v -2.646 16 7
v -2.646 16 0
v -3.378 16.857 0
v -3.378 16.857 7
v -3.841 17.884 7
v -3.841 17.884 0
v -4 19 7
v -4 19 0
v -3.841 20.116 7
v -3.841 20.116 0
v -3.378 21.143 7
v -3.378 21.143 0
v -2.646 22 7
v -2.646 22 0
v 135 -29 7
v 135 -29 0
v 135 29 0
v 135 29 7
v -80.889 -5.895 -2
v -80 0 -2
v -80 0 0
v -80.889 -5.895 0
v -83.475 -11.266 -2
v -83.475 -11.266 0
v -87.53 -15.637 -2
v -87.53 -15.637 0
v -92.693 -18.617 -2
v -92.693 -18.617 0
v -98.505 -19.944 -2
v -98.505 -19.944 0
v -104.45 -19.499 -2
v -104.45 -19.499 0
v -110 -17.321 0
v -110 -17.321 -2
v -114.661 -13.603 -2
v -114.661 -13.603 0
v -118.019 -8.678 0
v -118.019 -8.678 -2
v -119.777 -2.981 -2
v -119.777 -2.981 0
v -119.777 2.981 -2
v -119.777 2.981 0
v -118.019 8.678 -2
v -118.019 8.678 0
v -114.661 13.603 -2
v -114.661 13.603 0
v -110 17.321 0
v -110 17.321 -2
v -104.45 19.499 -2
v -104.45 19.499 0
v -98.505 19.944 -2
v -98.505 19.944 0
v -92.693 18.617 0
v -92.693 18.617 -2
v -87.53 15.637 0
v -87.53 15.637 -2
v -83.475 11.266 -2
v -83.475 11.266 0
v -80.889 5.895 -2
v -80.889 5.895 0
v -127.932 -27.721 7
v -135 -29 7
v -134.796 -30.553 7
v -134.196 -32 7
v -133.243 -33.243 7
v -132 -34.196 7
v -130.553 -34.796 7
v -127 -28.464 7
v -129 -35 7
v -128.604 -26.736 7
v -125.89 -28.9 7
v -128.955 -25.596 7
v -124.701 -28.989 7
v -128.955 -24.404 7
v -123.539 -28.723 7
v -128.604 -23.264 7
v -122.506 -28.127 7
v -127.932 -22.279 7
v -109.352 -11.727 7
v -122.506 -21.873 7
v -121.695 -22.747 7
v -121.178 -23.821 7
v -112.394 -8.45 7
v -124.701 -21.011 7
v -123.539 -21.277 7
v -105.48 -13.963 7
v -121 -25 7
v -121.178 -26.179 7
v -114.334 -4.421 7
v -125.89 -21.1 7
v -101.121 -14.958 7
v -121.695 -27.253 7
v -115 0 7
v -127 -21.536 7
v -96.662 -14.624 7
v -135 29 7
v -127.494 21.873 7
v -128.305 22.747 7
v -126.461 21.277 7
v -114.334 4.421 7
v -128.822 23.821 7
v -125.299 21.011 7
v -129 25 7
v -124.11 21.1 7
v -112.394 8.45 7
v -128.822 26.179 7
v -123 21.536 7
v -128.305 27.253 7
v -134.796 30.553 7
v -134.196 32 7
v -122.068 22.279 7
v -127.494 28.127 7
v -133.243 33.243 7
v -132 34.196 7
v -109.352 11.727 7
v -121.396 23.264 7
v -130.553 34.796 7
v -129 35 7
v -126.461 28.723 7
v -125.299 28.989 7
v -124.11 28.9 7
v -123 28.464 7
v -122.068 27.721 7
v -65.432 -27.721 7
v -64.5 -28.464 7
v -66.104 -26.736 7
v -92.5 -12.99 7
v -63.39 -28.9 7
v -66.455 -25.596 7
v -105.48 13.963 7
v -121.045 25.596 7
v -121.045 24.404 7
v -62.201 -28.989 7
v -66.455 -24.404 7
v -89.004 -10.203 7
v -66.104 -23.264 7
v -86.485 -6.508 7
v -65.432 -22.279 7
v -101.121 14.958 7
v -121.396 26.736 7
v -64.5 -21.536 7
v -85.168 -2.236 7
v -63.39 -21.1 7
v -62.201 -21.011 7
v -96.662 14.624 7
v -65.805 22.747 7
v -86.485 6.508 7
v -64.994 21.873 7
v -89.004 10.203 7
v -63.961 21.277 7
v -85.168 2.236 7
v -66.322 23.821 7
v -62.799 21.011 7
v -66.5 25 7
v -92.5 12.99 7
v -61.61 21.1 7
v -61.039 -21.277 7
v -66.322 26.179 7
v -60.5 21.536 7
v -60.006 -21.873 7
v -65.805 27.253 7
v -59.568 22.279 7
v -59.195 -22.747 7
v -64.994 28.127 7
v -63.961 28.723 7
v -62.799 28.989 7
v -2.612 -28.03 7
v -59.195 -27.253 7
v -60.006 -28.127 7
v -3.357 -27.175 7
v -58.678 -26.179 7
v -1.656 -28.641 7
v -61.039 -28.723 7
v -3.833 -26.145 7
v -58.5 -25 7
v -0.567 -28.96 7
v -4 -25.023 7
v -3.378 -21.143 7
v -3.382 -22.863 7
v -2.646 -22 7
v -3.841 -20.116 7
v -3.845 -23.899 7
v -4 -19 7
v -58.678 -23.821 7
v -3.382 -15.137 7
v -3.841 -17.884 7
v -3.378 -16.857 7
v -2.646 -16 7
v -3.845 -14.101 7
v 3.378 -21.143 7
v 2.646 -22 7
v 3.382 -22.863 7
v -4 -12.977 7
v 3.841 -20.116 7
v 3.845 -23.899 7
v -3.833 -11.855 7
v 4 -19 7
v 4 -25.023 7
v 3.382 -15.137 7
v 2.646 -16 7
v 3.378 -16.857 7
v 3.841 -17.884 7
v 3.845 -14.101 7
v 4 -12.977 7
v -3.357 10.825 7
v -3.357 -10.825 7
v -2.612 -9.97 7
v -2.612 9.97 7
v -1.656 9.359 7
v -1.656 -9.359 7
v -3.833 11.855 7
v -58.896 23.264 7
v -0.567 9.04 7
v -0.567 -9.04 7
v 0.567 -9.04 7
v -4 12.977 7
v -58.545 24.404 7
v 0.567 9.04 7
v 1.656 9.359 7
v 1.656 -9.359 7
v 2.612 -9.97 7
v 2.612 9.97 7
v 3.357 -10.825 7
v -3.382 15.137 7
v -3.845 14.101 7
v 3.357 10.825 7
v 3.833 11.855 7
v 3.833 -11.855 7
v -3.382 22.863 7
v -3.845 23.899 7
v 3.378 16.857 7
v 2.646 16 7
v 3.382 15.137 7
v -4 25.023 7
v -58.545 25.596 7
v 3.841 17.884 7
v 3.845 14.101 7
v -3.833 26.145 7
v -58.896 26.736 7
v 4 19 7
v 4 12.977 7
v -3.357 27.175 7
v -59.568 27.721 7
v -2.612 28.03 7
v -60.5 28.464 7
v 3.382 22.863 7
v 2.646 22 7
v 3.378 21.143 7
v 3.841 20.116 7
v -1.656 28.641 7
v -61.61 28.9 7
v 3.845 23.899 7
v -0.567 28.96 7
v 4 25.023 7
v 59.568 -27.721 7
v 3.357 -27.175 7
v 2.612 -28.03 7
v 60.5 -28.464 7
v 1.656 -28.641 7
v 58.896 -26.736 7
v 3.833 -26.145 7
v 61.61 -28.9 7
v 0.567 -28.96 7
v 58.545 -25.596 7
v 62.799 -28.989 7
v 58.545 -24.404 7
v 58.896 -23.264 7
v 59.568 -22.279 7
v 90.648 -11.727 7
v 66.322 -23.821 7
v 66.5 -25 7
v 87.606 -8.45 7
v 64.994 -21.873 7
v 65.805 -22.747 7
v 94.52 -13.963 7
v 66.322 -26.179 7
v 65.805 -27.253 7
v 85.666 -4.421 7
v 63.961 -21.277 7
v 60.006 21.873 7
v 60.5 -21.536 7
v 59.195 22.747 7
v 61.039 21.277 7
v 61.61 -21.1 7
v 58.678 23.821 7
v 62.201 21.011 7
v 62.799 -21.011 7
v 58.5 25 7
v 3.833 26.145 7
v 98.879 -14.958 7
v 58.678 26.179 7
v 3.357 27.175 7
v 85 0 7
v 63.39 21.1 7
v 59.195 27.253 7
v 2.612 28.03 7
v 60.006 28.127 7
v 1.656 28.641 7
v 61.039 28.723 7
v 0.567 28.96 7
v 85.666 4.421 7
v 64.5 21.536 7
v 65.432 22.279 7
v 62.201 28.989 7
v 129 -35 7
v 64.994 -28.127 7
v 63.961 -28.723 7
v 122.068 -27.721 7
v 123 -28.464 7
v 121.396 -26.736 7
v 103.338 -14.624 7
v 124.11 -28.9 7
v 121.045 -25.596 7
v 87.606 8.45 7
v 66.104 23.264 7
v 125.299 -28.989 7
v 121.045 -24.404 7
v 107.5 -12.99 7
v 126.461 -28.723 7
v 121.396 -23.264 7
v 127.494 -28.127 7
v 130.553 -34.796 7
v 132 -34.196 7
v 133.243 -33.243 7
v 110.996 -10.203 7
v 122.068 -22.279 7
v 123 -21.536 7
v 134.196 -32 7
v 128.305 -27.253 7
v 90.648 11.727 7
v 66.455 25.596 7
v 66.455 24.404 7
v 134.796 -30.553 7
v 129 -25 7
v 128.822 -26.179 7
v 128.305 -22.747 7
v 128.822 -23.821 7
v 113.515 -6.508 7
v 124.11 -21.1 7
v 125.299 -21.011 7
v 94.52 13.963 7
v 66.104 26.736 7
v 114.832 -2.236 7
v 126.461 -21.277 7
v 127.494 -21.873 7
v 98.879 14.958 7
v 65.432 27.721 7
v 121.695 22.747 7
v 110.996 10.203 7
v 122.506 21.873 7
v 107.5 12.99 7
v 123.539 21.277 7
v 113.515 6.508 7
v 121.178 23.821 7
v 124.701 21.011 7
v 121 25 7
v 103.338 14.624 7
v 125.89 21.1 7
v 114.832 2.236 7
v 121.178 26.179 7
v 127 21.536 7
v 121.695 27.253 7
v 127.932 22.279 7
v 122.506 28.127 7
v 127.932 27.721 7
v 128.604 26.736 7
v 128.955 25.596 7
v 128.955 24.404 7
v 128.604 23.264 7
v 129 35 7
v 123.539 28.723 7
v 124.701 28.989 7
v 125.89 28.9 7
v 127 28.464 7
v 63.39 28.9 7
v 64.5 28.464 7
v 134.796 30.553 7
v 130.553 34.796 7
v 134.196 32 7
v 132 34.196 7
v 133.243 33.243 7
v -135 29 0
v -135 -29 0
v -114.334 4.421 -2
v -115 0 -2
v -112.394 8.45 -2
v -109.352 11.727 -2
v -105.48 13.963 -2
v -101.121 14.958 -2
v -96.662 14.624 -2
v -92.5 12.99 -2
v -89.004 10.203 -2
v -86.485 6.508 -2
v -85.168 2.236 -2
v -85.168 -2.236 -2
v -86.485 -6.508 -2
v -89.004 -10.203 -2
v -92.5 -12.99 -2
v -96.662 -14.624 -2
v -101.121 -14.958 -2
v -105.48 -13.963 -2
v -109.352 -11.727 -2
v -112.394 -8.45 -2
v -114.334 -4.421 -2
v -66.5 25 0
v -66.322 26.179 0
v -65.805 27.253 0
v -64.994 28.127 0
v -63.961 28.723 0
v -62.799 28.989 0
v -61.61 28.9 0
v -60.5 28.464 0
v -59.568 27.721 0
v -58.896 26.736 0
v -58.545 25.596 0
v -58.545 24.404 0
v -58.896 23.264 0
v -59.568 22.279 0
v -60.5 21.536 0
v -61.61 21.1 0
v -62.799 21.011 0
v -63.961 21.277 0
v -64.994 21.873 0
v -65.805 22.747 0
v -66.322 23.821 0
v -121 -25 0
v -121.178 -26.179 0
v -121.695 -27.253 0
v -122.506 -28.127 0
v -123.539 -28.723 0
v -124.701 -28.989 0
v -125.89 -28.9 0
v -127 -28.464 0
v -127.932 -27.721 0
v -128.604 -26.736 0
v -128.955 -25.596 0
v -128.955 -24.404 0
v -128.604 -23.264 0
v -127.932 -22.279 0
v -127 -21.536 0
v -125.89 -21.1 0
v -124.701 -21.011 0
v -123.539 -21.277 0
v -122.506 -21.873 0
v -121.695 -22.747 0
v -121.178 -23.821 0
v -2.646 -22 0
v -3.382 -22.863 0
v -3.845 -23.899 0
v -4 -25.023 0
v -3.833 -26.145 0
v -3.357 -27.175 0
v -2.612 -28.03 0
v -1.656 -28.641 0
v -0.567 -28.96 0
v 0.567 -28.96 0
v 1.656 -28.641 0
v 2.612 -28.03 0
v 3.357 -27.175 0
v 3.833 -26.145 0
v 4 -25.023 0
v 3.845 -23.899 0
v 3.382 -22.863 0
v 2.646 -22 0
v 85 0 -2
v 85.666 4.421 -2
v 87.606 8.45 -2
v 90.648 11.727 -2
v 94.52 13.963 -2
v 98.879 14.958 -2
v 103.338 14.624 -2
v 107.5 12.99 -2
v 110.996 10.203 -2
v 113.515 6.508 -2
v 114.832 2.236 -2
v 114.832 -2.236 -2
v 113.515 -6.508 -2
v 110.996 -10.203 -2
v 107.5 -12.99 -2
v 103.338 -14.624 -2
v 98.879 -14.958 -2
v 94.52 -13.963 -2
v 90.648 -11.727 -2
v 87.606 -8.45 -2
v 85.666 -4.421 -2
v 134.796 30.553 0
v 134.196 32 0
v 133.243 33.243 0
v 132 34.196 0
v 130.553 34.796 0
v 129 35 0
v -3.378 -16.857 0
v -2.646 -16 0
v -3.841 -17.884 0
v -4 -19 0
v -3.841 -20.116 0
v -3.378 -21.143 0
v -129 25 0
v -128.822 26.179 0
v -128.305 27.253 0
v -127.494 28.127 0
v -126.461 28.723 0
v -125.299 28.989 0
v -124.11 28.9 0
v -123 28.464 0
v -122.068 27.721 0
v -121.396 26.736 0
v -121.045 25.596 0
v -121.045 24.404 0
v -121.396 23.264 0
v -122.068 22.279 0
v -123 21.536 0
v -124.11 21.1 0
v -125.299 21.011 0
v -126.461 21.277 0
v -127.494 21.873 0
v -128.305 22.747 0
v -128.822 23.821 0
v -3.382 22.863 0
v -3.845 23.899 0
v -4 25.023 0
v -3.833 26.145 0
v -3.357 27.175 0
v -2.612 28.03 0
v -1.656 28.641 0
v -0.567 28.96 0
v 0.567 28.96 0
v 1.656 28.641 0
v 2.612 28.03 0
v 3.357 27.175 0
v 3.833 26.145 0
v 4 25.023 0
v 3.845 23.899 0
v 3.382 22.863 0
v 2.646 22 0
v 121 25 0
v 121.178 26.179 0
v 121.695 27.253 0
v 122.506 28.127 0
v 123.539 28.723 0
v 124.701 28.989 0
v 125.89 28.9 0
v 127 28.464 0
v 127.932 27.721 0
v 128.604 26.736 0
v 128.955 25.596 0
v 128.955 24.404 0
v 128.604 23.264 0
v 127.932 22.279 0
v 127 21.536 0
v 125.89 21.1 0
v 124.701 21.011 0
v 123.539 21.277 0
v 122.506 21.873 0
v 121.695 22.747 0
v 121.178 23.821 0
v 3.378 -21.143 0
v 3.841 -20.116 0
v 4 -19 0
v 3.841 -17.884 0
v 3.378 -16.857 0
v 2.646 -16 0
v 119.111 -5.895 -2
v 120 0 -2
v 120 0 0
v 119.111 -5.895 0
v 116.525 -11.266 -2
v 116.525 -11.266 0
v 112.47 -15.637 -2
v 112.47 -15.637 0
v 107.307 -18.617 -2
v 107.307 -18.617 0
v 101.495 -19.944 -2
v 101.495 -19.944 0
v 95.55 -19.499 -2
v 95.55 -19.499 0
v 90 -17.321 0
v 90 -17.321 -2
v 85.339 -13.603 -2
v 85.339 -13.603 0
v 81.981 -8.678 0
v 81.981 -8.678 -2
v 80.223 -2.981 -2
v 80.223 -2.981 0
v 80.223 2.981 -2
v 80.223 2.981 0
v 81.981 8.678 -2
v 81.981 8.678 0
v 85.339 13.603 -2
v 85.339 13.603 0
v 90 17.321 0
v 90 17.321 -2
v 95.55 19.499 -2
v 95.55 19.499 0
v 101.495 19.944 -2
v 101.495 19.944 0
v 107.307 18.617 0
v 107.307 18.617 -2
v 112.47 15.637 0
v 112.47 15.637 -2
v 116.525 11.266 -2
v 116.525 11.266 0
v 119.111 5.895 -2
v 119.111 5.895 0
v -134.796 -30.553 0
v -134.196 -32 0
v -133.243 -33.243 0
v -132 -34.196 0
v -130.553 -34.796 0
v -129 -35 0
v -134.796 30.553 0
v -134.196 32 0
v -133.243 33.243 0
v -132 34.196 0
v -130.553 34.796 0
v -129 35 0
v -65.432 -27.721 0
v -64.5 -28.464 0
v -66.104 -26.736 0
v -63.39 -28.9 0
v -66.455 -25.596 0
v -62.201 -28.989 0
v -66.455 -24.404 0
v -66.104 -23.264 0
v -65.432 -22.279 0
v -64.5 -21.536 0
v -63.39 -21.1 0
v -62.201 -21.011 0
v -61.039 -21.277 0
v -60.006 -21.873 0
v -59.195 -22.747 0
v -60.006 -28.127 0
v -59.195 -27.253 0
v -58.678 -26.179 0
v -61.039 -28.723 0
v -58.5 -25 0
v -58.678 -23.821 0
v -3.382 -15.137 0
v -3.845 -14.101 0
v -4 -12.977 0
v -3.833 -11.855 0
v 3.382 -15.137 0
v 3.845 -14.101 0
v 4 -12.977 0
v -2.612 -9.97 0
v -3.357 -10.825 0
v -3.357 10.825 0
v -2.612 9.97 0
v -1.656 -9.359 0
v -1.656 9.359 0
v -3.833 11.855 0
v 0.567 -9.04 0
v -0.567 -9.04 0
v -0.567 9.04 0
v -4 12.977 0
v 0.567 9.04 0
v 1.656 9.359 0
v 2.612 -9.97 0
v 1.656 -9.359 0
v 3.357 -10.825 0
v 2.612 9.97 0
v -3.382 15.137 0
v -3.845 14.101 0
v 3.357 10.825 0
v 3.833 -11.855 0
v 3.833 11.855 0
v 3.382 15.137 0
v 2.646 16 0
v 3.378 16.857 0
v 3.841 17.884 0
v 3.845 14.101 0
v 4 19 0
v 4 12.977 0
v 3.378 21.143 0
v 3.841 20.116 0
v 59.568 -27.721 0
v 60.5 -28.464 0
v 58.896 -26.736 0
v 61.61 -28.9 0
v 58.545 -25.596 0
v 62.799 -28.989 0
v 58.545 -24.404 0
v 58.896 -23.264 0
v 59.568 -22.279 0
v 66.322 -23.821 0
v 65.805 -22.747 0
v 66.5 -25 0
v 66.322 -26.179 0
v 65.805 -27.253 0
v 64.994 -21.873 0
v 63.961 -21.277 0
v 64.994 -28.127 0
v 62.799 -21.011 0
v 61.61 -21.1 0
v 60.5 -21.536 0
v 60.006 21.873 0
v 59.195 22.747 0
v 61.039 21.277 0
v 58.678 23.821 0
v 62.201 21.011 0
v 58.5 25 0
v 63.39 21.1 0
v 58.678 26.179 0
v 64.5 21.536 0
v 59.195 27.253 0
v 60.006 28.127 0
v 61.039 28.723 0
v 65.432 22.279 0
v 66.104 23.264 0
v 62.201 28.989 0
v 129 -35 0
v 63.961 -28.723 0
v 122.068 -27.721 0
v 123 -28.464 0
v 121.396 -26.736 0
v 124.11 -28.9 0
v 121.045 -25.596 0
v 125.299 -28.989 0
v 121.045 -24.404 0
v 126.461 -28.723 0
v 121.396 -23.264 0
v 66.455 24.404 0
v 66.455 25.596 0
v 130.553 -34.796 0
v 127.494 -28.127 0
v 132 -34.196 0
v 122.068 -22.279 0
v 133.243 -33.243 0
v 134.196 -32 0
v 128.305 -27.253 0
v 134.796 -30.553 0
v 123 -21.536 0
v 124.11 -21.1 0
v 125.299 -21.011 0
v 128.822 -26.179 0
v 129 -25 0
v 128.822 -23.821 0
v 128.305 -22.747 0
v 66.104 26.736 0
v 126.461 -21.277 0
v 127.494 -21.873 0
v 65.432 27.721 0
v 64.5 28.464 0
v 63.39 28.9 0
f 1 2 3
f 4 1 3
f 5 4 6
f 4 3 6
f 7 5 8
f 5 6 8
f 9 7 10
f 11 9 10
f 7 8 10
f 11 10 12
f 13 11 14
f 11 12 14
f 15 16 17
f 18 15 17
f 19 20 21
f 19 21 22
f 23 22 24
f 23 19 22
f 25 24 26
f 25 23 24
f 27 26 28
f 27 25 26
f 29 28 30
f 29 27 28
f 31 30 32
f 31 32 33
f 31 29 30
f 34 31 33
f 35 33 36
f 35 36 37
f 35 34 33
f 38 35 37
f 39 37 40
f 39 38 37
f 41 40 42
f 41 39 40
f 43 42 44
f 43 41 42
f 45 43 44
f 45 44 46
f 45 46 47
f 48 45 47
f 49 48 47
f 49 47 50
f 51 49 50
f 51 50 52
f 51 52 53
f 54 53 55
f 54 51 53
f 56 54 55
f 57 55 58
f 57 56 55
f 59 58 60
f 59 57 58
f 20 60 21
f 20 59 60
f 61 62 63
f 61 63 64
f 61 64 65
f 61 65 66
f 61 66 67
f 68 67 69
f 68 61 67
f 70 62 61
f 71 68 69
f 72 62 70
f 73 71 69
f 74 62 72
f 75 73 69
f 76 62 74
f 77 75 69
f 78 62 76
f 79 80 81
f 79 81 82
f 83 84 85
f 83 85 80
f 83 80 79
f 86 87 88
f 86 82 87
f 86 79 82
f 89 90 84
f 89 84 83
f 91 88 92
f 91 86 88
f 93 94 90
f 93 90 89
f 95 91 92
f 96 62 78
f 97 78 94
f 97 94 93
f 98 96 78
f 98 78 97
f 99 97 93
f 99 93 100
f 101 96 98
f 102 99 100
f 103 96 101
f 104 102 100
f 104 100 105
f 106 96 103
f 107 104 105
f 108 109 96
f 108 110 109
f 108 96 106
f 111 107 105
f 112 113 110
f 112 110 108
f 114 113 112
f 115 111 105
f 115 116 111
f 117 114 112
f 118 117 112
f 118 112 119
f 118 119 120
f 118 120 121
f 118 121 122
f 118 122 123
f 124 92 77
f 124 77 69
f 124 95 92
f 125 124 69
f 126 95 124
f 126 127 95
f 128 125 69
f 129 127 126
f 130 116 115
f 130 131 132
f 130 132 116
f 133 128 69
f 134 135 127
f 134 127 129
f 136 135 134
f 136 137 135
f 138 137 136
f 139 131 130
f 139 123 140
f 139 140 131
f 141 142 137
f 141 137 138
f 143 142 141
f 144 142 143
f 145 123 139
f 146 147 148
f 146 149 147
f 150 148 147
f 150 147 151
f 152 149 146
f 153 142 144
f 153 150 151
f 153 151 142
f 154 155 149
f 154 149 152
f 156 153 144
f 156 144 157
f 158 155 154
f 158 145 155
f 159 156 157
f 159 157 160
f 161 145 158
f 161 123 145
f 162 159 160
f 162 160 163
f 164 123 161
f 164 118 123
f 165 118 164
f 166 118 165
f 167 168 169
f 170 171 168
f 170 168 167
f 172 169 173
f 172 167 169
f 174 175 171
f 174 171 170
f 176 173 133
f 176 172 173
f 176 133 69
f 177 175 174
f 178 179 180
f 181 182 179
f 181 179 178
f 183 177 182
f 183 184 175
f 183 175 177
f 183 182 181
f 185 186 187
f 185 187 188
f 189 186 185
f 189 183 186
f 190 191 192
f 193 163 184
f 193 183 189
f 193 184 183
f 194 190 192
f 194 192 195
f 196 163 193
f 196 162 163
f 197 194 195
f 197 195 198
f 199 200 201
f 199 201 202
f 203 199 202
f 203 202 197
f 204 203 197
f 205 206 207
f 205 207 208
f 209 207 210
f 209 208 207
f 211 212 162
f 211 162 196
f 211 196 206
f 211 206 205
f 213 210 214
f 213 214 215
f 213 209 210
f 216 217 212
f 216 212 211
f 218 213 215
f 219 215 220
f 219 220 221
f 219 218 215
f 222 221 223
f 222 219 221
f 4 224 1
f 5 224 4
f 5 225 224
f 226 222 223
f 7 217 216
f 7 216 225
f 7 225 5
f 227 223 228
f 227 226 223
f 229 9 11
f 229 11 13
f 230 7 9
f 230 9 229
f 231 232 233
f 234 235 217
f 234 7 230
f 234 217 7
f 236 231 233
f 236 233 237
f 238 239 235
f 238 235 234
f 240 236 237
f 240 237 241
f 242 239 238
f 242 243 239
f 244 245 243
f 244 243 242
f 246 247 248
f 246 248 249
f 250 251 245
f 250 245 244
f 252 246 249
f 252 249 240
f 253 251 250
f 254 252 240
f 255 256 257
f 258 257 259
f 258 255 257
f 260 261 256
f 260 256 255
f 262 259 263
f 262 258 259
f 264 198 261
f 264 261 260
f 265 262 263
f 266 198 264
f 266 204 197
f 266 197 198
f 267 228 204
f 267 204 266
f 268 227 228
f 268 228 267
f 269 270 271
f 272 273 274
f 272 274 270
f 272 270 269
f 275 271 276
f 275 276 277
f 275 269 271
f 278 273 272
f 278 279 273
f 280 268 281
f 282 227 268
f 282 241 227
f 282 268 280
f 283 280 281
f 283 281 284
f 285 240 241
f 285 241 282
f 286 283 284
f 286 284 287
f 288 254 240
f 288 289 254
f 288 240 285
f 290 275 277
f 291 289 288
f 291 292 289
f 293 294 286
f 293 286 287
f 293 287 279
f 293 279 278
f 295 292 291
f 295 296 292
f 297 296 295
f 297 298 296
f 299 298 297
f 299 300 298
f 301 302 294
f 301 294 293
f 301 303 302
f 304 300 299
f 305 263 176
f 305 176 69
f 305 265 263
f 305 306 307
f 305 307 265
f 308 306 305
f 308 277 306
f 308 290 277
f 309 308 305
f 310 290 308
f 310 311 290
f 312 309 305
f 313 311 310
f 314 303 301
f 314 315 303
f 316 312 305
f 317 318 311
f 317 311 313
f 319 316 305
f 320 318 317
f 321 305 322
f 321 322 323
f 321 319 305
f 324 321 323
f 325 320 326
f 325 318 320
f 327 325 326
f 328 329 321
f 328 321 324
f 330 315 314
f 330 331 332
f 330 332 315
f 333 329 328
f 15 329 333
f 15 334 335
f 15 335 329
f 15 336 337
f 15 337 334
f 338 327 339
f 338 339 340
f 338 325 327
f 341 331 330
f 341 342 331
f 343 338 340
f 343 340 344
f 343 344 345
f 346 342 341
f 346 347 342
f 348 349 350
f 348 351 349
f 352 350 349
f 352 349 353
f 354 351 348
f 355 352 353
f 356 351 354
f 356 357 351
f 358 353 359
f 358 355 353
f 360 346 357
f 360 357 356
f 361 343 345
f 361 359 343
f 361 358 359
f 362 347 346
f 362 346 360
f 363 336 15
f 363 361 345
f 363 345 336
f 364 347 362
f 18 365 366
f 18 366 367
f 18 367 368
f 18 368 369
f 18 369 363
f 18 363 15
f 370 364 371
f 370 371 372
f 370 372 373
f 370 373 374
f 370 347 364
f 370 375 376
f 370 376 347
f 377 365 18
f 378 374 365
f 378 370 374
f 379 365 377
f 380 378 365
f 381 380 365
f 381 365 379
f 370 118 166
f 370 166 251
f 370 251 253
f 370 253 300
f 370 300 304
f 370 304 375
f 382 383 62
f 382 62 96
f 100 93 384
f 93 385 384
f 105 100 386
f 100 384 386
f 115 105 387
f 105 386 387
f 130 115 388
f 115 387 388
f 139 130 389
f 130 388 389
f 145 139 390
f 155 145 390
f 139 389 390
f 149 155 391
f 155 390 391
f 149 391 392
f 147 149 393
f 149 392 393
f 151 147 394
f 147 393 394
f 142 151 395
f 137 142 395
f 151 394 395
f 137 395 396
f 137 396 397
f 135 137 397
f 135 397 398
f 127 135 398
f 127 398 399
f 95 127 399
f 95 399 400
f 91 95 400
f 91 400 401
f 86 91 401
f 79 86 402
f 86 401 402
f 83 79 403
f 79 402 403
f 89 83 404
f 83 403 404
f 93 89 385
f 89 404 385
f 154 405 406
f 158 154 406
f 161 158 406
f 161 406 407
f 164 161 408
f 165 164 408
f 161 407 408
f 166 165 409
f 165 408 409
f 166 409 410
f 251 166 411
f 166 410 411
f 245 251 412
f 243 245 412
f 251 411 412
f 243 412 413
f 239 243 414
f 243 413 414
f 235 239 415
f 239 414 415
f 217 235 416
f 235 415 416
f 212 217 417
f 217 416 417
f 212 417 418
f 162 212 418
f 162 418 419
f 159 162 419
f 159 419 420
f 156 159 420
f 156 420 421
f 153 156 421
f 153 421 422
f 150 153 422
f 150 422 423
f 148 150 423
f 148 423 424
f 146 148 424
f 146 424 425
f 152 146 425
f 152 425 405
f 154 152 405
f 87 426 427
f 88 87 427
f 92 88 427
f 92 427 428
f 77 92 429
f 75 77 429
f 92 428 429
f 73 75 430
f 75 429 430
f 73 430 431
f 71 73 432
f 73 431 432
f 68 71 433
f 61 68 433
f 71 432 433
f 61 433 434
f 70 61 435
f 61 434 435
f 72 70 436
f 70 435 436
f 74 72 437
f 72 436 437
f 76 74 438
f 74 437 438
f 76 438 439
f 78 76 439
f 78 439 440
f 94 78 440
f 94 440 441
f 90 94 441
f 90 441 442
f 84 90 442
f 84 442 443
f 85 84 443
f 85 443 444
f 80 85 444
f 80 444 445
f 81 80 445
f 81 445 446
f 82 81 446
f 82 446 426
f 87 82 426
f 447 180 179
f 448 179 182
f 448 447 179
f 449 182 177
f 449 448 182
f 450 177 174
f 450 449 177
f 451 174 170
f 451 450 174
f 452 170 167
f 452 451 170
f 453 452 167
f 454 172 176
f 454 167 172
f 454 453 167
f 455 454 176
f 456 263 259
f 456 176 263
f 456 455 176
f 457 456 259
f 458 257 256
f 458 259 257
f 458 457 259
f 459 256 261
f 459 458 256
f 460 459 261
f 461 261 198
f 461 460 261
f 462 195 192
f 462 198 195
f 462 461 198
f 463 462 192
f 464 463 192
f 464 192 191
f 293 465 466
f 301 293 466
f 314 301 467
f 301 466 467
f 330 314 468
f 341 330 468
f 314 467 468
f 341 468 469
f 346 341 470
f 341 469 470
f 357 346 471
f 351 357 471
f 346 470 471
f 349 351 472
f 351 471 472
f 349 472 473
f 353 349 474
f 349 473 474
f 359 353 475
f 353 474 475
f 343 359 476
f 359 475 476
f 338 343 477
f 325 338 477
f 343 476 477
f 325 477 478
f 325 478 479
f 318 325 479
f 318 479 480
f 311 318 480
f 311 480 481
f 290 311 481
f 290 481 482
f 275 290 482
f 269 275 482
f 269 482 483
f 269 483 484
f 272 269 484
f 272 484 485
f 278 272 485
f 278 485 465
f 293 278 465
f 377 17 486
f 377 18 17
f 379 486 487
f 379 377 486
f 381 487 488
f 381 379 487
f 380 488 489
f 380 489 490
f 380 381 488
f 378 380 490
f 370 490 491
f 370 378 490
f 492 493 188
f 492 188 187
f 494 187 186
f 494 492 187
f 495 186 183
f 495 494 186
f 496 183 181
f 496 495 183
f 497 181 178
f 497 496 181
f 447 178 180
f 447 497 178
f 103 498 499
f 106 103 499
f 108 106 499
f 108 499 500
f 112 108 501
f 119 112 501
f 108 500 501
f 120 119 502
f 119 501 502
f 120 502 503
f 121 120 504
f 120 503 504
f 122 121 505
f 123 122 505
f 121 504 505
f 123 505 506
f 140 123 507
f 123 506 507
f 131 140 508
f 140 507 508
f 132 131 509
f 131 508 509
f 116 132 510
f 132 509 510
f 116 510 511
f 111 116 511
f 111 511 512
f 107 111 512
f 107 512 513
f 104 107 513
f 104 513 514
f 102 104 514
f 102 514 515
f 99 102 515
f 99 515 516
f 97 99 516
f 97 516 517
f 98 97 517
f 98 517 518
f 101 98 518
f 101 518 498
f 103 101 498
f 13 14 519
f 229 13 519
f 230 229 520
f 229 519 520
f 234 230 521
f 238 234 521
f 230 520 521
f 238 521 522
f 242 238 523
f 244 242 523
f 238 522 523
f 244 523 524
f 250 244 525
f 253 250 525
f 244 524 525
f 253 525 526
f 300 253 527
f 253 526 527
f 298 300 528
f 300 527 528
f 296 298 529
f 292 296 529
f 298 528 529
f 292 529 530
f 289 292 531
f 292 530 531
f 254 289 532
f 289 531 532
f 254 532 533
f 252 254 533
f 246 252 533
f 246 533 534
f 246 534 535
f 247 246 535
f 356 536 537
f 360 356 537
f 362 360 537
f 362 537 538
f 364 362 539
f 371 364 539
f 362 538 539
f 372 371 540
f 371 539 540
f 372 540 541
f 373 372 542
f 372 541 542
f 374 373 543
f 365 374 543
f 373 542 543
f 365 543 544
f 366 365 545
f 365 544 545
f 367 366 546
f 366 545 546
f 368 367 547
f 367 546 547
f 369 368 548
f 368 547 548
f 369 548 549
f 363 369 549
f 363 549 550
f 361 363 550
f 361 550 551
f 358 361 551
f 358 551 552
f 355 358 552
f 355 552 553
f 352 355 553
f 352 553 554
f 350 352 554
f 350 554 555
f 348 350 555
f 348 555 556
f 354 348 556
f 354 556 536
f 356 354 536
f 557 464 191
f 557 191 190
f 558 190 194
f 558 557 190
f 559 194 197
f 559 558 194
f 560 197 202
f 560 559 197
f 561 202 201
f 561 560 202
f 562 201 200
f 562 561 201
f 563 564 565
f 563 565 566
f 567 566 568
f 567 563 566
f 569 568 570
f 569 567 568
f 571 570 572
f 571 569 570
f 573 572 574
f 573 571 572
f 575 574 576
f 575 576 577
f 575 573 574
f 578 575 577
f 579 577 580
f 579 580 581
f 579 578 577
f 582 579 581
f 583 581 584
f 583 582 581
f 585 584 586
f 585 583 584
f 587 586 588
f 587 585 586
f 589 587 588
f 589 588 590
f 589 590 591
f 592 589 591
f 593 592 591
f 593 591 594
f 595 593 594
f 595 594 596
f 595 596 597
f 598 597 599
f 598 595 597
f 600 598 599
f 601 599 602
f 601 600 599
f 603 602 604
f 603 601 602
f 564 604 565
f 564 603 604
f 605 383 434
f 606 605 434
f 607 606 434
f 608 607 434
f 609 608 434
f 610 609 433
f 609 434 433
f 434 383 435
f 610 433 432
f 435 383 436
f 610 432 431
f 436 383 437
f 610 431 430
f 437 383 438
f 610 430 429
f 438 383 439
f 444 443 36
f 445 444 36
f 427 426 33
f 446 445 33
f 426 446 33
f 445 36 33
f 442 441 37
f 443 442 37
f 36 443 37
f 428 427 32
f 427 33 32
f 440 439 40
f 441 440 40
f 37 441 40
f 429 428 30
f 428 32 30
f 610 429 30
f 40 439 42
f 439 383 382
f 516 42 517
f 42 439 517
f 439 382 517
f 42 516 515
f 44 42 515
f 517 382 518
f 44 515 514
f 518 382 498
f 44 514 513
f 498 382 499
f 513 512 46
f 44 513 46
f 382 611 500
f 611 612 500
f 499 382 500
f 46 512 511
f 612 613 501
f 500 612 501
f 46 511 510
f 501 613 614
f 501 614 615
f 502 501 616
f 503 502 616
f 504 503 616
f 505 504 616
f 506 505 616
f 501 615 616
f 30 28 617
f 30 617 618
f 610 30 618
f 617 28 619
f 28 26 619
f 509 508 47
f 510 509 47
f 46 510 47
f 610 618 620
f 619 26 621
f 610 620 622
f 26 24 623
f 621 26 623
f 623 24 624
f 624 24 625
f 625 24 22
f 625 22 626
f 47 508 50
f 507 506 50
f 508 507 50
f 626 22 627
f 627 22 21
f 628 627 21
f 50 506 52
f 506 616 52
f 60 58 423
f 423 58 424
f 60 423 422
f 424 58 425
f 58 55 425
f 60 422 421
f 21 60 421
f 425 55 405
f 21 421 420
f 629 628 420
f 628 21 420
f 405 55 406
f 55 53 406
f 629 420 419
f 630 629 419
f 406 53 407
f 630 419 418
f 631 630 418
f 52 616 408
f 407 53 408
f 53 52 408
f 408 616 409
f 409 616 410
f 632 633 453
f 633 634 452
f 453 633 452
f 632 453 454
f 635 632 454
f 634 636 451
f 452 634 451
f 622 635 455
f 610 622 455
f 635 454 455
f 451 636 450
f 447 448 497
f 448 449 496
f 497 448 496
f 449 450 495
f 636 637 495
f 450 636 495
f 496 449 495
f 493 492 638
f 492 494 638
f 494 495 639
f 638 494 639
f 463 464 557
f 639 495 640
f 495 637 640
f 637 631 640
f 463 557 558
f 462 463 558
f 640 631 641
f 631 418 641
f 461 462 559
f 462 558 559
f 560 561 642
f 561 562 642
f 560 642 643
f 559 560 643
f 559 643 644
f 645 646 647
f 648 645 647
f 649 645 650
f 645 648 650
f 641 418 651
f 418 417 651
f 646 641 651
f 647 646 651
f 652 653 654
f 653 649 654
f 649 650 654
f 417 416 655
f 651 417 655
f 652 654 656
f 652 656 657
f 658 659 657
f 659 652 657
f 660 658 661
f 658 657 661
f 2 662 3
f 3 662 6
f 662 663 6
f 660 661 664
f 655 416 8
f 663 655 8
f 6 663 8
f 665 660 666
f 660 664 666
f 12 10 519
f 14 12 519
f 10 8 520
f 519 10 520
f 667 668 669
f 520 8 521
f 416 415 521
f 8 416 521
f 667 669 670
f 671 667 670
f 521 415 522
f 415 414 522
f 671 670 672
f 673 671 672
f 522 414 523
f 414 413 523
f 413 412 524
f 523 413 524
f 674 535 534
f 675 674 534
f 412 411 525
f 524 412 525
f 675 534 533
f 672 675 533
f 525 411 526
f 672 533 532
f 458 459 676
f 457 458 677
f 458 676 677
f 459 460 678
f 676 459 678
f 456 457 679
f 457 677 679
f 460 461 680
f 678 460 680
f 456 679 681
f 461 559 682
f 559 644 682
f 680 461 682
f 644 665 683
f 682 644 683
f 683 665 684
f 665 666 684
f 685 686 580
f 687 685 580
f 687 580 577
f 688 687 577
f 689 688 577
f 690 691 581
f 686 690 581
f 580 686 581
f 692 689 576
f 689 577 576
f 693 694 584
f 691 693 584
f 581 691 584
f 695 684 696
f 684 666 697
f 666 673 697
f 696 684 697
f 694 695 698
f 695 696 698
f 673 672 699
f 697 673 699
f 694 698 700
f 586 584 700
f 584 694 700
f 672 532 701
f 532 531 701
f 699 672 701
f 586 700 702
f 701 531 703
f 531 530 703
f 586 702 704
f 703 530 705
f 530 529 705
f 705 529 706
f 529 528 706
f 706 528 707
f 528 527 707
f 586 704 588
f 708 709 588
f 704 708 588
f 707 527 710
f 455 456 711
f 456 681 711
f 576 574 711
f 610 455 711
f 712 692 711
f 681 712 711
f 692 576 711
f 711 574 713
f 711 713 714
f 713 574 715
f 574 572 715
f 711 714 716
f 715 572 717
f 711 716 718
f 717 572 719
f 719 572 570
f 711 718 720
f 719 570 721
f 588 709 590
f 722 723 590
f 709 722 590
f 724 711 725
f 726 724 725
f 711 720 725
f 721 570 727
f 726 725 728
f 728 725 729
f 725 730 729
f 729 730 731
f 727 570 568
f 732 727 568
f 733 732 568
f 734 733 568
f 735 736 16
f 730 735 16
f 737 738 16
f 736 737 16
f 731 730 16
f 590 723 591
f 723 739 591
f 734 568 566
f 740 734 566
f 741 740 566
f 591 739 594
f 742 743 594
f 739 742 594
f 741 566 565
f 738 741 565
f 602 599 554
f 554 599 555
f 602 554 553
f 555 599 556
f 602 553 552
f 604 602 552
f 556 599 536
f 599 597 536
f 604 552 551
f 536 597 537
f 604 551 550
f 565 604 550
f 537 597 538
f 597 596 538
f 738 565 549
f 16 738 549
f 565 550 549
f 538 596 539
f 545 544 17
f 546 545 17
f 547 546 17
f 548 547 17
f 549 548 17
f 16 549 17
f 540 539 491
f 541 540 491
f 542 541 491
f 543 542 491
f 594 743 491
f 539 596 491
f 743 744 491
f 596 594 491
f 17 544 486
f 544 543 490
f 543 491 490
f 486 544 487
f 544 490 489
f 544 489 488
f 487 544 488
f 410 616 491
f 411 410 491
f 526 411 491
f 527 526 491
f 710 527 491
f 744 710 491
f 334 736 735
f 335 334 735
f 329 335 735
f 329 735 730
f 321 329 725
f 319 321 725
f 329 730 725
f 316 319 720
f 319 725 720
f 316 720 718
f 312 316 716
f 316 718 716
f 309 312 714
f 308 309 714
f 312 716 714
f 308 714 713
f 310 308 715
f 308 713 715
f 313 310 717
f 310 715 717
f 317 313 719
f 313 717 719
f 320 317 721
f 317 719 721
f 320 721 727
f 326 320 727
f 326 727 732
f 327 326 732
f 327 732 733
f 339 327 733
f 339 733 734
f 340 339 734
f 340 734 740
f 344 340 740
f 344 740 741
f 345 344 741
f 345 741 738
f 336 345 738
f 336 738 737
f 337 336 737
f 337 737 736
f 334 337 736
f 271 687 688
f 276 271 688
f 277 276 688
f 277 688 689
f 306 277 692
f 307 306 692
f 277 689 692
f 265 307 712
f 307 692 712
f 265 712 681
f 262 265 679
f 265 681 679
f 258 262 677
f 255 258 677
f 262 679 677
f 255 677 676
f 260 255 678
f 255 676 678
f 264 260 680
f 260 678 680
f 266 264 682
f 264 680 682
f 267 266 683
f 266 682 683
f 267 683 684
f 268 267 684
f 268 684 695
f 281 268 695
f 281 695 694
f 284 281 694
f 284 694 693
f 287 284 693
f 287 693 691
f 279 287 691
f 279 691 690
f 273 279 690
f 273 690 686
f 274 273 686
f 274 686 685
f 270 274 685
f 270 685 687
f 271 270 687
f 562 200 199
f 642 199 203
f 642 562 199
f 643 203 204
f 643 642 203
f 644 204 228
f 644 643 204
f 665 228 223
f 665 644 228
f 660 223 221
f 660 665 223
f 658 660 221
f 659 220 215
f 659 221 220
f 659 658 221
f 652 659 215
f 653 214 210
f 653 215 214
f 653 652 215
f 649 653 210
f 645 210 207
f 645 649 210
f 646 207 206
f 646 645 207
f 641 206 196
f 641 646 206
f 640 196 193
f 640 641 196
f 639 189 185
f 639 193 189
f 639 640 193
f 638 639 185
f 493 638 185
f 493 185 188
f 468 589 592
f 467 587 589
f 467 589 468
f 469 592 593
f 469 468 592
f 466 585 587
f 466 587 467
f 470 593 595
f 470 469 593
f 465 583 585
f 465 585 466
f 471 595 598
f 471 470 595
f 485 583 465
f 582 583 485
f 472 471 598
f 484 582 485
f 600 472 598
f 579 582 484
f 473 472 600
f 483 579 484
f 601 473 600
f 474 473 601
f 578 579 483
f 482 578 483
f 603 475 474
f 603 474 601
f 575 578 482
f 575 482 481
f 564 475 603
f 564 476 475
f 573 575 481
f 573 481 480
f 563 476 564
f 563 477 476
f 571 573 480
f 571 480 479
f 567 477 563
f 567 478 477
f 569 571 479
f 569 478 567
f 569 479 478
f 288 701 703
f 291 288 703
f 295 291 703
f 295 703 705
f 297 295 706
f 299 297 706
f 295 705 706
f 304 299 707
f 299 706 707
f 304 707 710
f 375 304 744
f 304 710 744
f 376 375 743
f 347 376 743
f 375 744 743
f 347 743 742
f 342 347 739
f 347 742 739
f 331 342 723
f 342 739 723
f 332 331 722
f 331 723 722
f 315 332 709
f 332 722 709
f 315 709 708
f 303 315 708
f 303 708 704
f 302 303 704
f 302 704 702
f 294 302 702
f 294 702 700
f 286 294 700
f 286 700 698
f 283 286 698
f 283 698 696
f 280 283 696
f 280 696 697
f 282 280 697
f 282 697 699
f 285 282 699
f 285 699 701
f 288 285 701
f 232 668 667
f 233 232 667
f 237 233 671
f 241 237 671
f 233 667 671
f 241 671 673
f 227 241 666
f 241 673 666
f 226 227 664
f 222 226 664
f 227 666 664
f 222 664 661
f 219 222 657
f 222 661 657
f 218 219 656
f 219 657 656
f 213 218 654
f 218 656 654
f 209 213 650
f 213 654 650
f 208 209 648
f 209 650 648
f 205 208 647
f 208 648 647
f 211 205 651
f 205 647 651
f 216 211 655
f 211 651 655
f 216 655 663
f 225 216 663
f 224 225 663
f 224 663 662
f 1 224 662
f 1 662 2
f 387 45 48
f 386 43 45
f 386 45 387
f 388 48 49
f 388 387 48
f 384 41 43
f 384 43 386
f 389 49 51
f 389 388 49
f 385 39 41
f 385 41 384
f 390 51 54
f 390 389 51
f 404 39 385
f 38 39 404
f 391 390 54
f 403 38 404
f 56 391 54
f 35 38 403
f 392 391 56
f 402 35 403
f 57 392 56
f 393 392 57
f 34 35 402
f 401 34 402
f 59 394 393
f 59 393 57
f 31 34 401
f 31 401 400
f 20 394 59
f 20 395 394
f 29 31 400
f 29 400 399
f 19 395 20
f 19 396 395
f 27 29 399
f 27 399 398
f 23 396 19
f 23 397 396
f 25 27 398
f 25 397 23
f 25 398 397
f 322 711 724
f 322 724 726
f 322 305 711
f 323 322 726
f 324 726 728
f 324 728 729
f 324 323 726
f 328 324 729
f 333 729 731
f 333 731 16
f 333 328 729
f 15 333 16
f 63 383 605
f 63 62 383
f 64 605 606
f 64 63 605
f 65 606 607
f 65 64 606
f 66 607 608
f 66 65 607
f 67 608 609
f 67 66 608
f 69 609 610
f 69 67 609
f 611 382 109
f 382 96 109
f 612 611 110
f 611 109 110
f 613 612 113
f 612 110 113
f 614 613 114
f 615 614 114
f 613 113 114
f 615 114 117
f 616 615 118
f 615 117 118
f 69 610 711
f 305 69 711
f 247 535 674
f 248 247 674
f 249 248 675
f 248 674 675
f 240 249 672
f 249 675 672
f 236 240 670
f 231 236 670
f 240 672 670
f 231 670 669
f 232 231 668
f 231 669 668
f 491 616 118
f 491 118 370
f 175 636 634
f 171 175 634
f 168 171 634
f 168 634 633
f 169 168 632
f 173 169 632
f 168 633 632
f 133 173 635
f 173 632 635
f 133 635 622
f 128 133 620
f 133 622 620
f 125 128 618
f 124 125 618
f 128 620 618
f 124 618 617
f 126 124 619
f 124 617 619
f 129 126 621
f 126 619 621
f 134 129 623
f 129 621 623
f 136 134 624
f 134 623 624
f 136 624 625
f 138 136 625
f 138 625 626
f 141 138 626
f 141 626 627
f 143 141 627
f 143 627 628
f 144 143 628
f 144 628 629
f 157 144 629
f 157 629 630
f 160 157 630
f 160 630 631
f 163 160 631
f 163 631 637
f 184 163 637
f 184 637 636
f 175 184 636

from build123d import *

# Parameters (mm, degrees)
SKETCH1_W           = 270
SKETCH1_H           = 70
BOSS_EXTRUDE1_DEPTH = 7
FILLET1_R           = 6
SKETCH2_R           = 15
SKETCH2_R_2         = 4
CUT_EXTRUDE1_DEPTH  = 10
BOSS_EXTRUDE2_START = 2
SKETCH3_R           = 20
SKETCH3_R_2         = 15
BOSS_EXTRUDE2_DEPTH = 2


with BuildPart() as part:
    # Sketch1 → Boss-Extrude1 (new body)
    with BuildSketch(Plane.XY):
        Rectangle(SKETCH1_W, SKETCH1_H)
    extrude(amount=BOSS_EXTRUDE1_DEPTH)

    # Fillet1
    fillet1_edges = [part.edges().sort_by_distance(p)[0] for p in [
        (135, -35, 3.5),
        (-135, -35, 3.5),
        (-135, 35, 3.5),
        (135, 35, 3.5),
    ]]
    fillet(fillet1_edges, radius=FILLET1_R)

    # Sketch2 → Cut-Extrude1 (cut)
    with BuildSketch(Plane(origin=(0, 0, 0), x_dir=(-1, 0, 0), z_dir=(0, 0, -1))):
        with Locations((-100, 0)):
            Circle(SKETCH2_R)
        with Locations((100, 0)):
            Circle(SKETCH2_R)
        with Locations((125, 25)):
            Circle(SKETCH2_R_2)
        with Locations((62.5, 25)):
            Circle(SKETCH2_R_2)
        with Locations((-62.5, 25)):
            Circle(SKETCH2_R_2)
        with Locations((-125, 25)):
            Circle(SKETCH2_R_2)
        with Locations(Location((-125, -25, 0), (0, 0, 180))):
            Circle(SKETCH2_R_2)
        with Locations(Location((-62.5, -25, 0), (0, 0, 180))):
            Circle(SKETCH2_R_2)
        with Locations(Location((62.5, -25, 0), (0, 0, 180))):
            Circle(SKETCH2_R_2)
        with Locations(Location((125, -25, 0), (0, 0, 180))):
            Circle(SKETCH2_R_2)
        with BuildLine():
            ThreePointArc((2.645751311, 22), (0, 29), (-2.645751311, 22))
            ThreePointArc((-2.645751311, 22), (-4, 19), (-2.645751311, 16))
            ThreePointArc((-2.645751311, 16), (0, 9), (2.645751311, 16))
            ThreePointArc((2.645751311, 16), (4, 19), (2.645751311, 22))
        make_face()
        with BuildLine():
            ThreePointArc((2.645751311, -22), (0, -29), (-2.645751311, -22))
            ThreePointArc((-2.645751311, -22), (-4, -19), (-2.645751311, -16))
            ThreePointArc((-2.645751311, -16), (0, -9), (2.645751311, -16))
            ThreePointArc((2.645751311, -16), (4, -19), (2.645751311, -22))
        make_face()
    extrude(amount=-CUT_EXTRUDE1_DEPTH, mode=Mode.SUBTRACT)

    # Sketch3 → Boss-Extrude2 (add)
    # profile 1 of 2: a face of its own
    with BuildSketch(Plane(origin=(0, 0, 0), x_dir=(-1, 0, 0), z_dir=(0, 0, -1)).offset(BOSS_EXTRUDE2_START)):
        with Locations(Location((-100, 0, 0), (0, 0, 180))):
            Circle(SKETCH3_R)
        with Locations((-100, 0)):
            Circle(SKETCH3_R_2, mode=Mode.SUBTRACT)
    # profile 2 of 2: a face of its own
    with BuildSketch(Plane(origin=(0, 0, 0), x_dir=(-1, 0, 0), z_dir=(0, 0, -1)).offset(BOSS_EXTRUDE2_START)):
        with Locations(Location((100, 0, 0), (0, 0, 180))):
            Circle(SKETCH3_R)
        with Locations((100, 0)):
            Circle(SKETCH3_R_2, mode=Mode.SUBTRACT)
    extrude(amount=-BOSS_EXTRUDE2_DEPTH)


solid = part.part
